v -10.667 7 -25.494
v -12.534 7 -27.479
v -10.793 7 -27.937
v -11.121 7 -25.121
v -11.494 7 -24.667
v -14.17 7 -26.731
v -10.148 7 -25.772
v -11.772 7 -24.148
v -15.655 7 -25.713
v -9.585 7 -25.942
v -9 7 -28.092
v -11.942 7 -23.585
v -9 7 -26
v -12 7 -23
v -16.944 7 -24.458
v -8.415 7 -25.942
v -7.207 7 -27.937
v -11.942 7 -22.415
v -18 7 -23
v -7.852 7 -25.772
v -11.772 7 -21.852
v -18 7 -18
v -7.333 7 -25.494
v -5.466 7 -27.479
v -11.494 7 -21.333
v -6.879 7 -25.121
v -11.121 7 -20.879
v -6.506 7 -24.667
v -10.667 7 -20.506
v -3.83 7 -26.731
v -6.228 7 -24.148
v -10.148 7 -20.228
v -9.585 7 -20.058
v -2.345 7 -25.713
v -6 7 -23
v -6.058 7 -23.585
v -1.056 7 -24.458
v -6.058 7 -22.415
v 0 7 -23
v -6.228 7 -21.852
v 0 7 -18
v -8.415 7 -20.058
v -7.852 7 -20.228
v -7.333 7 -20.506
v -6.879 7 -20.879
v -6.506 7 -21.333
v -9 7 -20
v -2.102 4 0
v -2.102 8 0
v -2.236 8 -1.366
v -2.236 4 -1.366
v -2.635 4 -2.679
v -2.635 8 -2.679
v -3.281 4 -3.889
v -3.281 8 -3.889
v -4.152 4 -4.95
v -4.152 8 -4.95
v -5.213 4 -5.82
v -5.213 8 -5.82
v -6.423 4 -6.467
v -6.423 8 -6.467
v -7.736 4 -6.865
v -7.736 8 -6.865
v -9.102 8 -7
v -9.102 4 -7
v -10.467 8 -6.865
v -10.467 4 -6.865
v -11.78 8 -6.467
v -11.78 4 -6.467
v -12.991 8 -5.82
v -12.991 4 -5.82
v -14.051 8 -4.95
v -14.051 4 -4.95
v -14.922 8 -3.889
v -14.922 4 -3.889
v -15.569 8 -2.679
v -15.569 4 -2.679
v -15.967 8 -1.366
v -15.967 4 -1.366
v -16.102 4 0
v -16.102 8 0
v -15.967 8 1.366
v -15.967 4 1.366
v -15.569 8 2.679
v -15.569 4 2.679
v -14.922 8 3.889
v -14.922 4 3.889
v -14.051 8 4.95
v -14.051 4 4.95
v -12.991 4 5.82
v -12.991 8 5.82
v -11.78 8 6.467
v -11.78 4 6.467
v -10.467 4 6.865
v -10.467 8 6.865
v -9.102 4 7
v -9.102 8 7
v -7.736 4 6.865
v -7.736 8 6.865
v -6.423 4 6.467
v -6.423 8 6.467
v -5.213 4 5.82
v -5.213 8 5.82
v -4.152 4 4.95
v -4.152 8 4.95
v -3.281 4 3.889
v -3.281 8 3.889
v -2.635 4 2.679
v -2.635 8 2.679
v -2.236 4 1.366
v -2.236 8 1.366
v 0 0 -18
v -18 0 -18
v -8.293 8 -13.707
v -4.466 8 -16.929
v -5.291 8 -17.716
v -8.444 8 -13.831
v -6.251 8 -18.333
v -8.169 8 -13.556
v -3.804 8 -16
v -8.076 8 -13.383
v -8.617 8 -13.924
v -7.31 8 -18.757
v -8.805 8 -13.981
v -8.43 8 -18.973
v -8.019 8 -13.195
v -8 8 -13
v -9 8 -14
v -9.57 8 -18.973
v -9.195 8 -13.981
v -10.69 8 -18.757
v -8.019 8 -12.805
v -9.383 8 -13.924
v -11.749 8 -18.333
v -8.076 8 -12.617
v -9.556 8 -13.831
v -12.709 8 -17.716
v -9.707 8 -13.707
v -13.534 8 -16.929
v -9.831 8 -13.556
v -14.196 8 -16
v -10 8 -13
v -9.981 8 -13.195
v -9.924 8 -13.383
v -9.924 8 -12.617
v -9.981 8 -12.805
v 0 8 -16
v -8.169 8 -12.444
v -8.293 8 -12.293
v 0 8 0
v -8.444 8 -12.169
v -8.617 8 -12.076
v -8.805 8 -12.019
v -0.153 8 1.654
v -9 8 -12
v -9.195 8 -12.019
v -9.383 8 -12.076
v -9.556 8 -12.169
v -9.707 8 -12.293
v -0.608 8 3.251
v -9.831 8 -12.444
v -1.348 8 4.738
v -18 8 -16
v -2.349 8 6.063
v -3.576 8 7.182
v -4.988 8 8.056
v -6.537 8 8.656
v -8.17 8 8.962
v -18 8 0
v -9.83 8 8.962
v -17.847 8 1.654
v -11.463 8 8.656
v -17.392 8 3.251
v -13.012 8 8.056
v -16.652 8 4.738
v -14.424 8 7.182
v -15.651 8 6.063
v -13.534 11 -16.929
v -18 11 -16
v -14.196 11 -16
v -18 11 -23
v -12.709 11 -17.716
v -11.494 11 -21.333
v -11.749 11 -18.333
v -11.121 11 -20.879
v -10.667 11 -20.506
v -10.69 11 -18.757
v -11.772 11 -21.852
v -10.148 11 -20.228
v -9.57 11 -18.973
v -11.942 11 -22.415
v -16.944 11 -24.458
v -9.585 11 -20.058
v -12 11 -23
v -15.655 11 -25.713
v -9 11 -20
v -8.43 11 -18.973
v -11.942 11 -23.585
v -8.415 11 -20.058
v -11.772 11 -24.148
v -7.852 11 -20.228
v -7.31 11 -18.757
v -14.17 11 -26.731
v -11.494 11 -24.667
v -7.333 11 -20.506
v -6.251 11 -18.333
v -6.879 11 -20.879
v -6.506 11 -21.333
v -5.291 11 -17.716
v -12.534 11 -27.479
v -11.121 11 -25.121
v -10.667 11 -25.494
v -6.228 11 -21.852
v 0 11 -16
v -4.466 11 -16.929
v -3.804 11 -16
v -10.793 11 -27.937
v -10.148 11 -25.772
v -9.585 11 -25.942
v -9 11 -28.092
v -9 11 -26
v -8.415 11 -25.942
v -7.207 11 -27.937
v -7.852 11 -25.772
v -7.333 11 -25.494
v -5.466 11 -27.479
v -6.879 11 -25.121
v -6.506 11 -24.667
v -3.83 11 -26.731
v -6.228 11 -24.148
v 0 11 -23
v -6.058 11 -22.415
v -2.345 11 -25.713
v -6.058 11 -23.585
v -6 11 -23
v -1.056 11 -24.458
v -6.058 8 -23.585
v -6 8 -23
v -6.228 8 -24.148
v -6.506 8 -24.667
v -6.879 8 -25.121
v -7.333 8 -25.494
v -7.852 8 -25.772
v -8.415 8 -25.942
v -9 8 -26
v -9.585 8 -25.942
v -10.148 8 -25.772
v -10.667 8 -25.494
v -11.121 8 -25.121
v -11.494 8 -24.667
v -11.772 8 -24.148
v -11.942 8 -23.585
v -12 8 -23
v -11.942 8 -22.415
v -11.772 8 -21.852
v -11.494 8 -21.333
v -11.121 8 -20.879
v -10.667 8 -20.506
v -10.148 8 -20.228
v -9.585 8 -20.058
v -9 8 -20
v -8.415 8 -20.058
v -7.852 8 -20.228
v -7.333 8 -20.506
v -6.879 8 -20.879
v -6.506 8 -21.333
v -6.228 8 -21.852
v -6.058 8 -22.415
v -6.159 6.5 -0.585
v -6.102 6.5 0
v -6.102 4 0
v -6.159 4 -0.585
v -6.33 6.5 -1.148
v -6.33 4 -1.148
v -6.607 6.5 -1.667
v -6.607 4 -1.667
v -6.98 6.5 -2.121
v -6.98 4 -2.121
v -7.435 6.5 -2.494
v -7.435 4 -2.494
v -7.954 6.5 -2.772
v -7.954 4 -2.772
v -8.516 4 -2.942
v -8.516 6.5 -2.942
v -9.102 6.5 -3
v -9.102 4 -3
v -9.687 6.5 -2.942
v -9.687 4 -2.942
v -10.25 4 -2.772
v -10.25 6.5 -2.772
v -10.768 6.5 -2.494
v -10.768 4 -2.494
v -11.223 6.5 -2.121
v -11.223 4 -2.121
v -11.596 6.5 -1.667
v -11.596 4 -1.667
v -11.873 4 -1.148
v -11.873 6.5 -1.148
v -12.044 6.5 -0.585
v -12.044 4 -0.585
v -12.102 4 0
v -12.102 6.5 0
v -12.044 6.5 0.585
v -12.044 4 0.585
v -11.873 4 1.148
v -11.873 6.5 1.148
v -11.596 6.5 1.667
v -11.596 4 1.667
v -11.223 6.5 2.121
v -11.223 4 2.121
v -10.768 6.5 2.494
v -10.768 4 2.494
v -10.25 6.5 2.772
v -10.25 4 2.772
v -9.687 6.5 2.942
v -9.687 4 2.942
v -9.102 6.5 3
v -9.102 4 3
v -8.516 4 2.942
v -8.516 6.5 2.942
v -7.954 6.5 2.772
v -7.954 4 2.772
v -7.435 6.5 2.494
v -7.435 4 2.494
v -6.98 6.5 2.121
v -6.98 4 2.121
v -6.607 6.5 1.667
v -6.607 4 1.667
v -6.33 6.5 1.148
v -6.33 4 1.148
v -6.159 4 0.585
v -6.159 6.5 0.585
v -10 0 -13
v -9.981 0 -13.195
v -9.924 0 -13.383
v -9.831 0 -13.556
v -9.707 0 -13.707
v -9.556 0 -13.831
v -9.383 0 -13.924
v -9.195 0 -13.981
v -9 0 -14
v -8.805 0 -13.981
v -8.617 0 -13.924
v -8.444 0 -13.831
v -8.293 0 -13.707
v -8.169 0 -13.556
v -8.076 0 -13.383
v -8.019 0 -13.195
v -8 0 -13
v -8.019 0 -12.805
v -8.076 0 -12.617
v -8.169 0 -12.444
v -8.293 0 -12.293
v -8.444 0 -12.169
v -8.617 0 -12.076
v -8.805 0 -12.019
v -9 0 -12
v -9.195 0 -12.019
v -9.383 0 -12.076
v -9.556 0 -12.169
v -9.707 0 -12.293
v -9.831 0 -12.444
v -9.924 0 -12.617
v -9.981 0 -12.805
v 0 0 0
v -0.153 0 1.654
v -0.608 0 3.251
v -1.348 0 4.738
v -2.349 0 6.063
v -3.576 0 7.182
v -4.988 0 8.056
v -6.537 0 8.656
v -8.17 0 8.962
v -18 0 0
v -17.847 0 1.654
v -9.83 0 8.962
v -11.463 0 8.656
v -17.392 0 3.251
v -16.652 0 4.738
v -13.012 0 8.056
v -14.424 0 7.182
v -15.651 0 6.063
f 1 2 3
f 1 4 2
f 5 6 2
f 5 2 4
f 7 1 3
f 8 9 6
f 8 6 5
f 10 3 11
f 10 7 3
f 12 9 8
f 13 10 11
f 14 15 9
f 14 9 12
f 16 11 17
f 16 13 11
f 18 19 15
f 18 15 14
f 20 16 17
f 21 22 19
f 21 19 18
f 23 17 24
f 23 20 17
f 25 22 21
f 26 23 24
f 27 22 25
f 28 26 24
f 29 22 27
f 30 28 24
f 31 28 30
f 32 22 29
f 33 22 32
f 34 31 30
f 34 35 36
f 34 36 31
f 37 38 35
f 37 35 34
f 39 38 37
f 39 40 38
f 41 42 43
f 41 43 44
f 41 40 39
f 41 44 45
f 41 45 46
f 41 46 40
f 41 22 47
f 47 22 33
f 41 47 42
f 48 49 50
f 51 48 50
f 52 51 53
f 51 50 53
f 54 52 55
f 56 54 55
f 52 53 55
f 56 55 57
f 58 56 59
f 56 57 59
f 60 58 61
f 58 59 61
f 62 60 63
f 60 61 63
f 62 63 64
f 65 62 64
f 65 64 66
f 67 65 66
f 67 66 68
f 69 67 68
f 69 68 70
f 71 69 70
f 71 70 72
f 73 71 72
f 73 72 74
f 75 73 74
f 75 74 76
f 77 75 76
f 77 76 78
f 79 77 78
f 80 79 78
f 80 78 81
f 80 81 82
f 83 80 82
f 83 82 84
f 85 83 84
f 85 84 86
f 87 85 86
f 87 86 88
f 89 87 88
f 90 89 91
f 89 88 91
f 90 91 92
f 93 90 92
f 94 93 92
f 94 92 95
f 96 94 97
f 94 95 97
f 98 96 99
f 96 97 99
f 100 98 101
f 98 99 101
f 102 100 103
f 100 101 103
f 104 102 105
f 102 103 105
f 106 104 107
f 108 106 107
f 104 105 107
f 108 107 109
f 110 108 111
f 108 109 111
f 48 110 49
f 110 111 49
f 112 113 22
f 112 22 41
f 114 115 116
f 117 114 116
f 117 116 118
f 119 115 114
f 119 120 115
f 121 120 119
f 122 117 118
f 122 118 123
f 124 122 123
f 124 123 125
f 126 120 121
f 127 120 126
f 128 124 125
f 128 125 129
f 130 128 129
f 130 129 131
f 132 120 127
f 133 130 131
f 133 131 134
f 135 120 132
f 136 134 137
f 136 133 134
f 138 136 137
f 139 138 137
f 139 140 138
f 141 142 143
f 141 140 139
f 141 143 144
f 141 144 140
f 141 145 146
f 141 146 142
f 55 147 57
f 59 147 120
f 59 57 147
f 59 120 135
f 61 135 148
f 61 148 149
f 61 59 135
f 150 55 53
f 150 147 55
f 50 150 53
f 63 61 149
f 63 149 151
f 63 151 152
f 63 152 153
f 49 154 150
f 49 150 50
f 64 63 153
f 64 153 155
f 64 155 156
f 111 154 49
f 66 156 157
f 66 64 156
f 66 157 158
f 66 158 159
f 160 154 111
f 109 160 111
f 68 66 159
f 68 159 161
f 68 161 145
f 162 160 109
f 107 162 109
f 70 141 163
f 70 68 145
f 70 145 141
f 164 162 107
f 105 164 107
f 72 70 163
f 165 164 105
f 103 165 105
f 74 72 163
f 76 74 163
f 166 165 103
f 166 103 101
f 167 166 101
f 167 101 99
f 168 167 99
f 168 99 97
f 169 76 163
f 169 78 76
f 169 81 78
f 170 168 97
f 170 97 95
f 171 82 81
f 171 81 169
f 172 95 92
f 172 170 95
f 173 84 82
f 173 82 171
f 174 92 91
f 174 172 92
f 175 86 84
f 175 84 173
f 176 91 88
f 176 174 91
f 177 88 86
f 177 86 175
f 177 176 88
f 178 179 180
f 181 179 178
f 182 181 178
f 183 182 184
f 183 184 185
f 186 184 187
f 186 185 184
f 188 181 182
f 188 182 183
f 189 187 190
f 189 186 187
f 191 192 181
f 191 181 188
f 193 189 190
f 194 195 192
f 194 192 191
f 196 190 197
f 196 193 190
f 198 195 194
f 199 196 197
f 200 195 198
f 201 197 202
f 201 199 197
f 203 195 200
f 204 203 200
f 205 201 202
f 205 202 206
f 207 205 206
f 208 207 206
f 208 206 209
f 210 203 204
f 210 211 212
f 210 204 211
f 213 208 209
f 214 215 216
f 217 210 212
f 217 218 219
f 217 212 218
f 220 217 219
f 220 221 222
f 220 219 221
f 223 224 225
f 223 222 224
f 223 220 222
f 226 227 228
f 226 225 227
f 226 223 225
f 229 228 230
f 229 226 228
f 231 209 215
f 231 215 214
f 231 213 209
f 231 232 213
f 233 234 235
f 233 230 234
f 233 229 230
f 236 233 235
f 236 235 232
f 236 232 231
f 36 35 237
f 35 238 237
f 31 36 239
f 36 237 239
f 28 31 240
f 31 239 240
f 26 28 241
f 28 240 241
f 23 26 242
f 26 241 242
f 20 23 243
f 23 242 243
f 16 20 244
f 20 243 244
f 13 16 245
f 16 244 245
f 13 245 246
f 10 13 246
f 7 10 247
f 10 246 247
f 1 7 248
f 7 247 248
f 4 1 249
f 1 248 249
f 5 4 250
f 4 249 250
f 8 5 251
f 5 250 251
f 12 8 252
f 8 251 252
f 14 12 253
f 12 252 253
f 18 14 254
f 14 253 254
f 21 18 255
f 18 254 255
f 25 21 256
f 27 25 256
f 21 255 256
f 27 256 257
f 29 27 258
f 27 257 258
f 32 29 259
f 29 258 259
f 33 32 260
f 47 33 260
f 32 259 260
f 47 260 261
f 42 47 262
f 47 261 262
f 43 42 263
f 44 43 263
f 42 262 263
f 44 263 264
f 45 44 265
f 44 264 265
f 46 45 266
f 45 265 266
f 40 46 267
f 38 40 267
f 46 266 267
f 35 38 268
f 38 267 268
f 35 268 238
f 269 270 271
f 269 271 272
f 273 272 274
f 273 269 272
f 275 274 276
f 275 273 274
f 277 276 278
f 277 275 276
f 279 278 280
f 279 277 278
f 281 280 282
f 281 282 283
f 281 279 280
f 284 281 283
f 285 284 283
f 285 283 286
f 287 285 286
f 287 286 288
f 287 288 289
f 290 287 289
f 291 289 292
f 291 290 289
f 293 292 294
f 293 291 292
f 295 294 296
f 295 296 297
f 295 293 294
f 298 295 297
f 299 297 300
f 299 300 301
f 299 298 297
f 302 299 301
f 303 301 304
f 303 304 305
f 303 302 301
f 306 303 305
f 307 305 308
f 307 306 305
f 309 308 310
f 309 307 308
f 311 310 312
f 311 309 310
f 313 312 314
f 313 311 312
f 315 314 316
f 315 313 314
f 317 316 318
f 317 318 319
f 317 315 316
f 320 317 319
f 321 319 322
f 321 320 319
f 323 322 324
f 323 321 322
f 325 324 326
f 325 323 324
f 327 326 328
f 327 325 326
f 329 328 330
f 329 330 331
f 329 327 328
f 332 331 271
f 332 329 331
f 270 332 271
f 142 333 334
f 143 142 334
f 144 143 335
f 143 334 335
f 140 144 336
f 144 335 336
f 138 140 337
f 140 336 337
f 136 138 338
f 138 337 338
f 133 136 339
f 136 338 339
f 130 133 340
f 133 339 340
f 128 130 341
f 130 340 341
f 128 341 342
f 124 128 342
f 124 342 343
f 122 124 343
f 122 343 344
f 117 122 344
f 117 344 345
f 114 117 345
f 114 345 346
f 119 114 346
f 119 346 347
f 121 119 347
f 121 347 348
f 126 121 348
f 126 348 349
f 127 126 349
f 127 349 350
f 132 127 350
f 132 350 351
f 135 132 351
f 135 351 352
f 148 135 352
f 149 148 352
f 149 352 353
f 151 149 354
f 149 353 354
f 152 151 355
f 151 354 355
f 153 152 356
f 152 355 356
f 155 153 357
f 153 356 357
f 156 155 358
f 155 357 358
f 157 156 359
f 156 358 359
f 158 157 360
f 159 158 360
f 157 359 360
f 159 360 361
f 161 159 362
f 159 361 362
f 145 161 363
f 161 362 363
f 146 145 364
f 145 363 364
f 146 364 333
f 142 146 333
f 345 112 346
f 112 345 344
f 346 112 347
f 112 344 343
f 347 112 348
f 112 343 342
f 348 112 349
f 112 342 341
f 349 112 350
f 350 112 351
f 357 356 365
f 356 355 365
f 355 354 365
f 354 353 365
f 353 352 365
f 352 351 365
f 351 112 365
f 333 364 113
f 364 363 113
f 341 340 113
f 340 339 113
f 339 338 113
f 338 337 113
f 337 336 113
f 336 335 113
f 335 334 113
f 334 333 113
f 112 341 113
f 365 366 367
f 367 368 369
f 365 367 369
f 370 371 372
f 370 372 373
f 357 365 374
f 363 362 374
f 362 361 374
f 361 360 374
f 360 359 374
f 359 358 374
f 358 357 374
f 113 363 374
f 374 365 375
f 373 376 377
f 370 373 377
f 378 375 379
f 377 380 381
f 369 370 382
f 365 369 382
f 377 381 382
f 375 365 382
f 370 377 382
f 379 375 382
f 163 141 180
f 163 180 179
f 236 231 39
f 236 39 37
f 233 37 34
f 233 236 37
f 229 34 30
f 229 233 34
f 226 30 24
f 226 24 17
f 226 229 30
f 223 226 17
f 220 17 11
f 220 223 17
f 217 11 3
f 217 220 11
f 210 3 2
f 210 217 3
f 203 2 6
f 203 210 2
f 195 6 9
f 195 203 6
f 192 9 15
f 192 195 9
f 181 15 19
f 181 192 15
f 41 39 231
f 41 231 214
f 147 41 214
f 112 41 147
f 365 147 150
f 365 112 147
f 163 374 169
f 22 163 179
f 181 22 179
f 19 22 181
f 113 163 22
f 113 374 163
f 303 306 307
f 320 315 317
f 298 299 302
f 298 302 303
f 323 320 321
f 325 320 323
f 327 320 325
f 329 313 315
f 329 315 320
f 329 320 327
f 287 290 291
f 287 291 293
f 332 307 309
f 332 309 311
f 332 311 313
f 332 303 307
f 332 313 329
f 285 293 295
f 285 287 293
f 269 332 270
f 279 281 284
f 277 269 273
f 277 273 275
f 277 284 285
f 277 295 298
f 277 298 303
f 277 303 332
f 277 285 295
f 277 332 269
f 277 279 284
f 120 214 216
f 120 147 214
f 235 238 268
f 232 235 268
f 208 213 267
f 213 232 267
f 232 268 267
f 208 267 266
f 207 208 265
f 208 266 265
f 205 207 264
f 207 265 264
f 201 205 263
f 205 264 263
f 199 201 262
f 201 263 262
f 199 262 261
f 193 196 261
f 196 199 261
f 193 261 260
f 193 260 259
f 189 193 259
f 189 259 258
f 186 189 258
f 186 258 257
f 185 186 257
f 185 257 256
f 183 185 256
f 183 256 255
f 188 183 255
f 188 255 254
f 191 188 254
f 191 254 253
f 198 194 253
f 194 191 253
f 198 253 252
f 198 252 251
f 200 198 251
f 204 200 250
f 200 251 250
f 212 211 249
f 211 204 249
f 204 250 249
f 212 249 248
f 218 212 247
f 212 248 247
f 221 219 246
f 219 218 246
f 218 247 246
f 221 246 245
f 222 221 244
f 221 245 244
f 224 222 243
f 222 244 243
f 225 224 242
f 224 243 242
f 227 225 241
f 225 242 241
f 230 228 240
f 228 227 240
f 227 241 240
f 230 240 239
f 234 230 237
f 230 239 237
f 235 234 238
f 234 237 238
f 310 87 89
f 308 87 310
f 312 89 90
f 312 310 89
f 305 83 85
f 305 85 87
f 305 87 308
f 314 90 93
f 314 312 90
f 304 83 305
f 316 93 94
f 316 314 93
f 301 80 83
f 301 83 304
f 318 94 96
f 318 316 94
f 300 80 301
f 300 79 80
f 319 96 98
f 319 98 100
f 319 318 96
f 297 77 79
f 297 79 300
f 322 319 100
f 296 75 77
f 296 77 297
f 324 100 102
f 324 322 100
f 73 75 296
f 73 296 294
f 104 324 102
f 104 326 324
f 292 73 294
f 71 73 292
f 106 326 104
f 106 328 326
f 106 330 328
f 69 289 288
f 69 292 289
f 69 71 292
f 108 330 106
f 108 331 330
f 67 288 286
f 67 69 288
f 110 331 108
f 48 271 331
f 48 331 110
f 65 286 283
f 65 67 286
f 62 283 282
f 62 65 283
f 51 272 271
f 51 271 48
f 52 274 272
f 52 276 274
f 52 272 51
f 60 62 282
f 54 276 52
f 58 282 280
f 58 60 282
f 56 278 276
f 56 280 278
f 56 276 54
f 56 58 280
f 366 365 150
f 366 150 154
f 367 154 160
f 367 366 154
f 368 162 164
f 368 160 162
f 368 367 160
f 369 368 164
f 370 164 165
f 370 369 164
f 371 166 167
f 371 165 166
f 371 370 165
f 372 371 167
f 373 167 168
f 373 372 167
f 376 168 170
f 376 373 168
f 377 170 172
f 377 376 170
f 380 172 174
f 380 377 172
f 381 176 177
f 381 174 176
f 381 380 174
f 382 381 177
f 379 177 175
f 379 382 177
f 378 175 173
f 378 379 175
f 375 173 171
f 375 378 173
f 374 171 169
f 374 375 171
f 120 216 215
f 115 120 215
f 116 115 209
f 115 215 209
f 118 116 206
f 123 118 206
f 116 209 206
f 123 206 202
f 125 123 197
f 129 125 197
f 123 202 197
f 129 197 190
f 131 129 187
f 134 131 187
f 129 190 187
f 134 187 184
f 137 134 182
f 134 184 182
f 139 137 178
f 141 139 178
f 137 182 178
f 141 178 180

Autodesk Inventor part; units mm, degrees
ref_plane "YZ Plane" through (0, 0, 0) normal (1, 0, 0) x (0, 1, 0)
ref_plane "XZ Plane" through (0, 0, 0) normal (0, 1, 0) x (-1, 0, 0)
ref_plane "XY Plane" through (0, 0, 0) normal (0, 0, 1) x (1, 0, 0)
sketch "Sketch1" plane through (0, 0, 0) normal (0, 1, 0) x (-1, 0, 0)
  line L0 (18, 0) -> (18, -30)
  line L1 (18, -30) -> (0, -30)
  line L2 (0, -30) -> (0, 0)
  arc A0 (18, 0) -> (0, 0) centre (9, 0) ccw
  circle A1 centre (9, -23) radius 1
  circle A2 centre (9, -13) radius 1
  dimension "d6" = 2
  dimension "d8" = 2
extrude "Extrusion1" add sketch "Sketch1" along normal blind 8
sketch "Sketch2" plane through (0, 8, 0) normal (0, 1, 0) x (1, 0, 0)
  circle A0 centre (-9.1017, 0) radius 3
  circle A1 centre (-9.1017, 0) radius 7
  point P0 (0, 0)
  dimension "d11" = 6
  dimension "d12" = 14
extrude "Extrusion2" cut sketch "Sketch2" against normal blind 4
sketch "Sketch3" plane through (-9.1017, 8, 0) normal (0, 1, 0) x (1, 0, 0)
  circle A0 centre (0, 0) radius 3
  point P0 (9.1017, 0)
extrude "Extrusion3" cut sketch "Sketch3" against normal blind 1.5
sketch "Sketch4" plane through (0, 8, 0) normal (0, 1, 0) x (1, 0, 0)
  line L0 (0, 23) -> (0, 16)
  line L1 (0, 16) -> (-18, 16)
  line L2 (-18, 16) -> (-18, 23)
  circle A0 centre (-9, 23) radius 3
  arc A1 (0, 23) -> (-18, 23) centre (-9, 17.5917) ccw
  point P0 (0, 0)
  dimension "d17" = 18
extrude "Extrusion4" add sketch "Sketch4" along normal blind 3
sketch "Sketch6" plane through (0, 0, 0) normal (0, -1, 0) x (1, 0, 0)
  line L0 (0, 0) -> (0, -30) projected
  line L1 (-18, -30) -> (-18, 0) projected
  line L2 (0, -30) -> (-18, -30)
  line L3 (-18, -30) -> (-18, -18)
  line L4 (-18, -18) -> (0, -18)
  line L5 (0, -18) -> (0, -30)
  dimension "d23" = 12
extrude "Extrusion5" cut sketch "Sketch6" against normal blind 7
sketch "Sketch7" plane through (0, 8, 0) normal (0, 1, 0) x (1, 0, 0)
  circle A0 centre (-9, 23) radius 3
  point P0 (0, 0)
  point P1 (-18, 23)
  point P2 (0, 30)
  point P3 (-6, 23)
  point P4 (-12, 23)
extrude "Extrusion6" cut sketch "Sketch7" against normal through all
sketch "Sketch8" plane through (0, 8, 0) normal (0, 1, 0) x (1, 0, 0)
  line L0 (-18, 30) -> (-18, 23) projected
  arc A0 (0, 23) -> (-18, 23) centre (-9, 17.5917) ccw
  line L1 (0, 30) -> (-18, 30) projected
  line L2 (3.2096, 23) -> (3.2096, 32.8991)
  line L3 (3.2096, 32.8991) -> (-22.1602, 32.8991)
  line L4 (-22.1602, 32.8991) -> (-22.1602, 23)
  line L5 (-22.1602, 23) -> (-18, 23)
  line L6 (0, 23) -> (3.2096, 23)
  point P0 (0, 0)
extrude "Extrusion7" cut sketch "Sketch8" against normal blind 7
sketch "Sketch11" plane through (0, 11, 0) normal (0, 1, 0) x (1, 0, 0)
  circle A0 centre (-9, 13) radius 1 projected
  circle A1 centre (-9, 13) radius 6
  point P0 (0, 0)
  dimension "d38" = 12
extrude "Extrusion9" cut sketch "Sketch11" against normal blind 3
properties part number "top hand base with 2 gears"
